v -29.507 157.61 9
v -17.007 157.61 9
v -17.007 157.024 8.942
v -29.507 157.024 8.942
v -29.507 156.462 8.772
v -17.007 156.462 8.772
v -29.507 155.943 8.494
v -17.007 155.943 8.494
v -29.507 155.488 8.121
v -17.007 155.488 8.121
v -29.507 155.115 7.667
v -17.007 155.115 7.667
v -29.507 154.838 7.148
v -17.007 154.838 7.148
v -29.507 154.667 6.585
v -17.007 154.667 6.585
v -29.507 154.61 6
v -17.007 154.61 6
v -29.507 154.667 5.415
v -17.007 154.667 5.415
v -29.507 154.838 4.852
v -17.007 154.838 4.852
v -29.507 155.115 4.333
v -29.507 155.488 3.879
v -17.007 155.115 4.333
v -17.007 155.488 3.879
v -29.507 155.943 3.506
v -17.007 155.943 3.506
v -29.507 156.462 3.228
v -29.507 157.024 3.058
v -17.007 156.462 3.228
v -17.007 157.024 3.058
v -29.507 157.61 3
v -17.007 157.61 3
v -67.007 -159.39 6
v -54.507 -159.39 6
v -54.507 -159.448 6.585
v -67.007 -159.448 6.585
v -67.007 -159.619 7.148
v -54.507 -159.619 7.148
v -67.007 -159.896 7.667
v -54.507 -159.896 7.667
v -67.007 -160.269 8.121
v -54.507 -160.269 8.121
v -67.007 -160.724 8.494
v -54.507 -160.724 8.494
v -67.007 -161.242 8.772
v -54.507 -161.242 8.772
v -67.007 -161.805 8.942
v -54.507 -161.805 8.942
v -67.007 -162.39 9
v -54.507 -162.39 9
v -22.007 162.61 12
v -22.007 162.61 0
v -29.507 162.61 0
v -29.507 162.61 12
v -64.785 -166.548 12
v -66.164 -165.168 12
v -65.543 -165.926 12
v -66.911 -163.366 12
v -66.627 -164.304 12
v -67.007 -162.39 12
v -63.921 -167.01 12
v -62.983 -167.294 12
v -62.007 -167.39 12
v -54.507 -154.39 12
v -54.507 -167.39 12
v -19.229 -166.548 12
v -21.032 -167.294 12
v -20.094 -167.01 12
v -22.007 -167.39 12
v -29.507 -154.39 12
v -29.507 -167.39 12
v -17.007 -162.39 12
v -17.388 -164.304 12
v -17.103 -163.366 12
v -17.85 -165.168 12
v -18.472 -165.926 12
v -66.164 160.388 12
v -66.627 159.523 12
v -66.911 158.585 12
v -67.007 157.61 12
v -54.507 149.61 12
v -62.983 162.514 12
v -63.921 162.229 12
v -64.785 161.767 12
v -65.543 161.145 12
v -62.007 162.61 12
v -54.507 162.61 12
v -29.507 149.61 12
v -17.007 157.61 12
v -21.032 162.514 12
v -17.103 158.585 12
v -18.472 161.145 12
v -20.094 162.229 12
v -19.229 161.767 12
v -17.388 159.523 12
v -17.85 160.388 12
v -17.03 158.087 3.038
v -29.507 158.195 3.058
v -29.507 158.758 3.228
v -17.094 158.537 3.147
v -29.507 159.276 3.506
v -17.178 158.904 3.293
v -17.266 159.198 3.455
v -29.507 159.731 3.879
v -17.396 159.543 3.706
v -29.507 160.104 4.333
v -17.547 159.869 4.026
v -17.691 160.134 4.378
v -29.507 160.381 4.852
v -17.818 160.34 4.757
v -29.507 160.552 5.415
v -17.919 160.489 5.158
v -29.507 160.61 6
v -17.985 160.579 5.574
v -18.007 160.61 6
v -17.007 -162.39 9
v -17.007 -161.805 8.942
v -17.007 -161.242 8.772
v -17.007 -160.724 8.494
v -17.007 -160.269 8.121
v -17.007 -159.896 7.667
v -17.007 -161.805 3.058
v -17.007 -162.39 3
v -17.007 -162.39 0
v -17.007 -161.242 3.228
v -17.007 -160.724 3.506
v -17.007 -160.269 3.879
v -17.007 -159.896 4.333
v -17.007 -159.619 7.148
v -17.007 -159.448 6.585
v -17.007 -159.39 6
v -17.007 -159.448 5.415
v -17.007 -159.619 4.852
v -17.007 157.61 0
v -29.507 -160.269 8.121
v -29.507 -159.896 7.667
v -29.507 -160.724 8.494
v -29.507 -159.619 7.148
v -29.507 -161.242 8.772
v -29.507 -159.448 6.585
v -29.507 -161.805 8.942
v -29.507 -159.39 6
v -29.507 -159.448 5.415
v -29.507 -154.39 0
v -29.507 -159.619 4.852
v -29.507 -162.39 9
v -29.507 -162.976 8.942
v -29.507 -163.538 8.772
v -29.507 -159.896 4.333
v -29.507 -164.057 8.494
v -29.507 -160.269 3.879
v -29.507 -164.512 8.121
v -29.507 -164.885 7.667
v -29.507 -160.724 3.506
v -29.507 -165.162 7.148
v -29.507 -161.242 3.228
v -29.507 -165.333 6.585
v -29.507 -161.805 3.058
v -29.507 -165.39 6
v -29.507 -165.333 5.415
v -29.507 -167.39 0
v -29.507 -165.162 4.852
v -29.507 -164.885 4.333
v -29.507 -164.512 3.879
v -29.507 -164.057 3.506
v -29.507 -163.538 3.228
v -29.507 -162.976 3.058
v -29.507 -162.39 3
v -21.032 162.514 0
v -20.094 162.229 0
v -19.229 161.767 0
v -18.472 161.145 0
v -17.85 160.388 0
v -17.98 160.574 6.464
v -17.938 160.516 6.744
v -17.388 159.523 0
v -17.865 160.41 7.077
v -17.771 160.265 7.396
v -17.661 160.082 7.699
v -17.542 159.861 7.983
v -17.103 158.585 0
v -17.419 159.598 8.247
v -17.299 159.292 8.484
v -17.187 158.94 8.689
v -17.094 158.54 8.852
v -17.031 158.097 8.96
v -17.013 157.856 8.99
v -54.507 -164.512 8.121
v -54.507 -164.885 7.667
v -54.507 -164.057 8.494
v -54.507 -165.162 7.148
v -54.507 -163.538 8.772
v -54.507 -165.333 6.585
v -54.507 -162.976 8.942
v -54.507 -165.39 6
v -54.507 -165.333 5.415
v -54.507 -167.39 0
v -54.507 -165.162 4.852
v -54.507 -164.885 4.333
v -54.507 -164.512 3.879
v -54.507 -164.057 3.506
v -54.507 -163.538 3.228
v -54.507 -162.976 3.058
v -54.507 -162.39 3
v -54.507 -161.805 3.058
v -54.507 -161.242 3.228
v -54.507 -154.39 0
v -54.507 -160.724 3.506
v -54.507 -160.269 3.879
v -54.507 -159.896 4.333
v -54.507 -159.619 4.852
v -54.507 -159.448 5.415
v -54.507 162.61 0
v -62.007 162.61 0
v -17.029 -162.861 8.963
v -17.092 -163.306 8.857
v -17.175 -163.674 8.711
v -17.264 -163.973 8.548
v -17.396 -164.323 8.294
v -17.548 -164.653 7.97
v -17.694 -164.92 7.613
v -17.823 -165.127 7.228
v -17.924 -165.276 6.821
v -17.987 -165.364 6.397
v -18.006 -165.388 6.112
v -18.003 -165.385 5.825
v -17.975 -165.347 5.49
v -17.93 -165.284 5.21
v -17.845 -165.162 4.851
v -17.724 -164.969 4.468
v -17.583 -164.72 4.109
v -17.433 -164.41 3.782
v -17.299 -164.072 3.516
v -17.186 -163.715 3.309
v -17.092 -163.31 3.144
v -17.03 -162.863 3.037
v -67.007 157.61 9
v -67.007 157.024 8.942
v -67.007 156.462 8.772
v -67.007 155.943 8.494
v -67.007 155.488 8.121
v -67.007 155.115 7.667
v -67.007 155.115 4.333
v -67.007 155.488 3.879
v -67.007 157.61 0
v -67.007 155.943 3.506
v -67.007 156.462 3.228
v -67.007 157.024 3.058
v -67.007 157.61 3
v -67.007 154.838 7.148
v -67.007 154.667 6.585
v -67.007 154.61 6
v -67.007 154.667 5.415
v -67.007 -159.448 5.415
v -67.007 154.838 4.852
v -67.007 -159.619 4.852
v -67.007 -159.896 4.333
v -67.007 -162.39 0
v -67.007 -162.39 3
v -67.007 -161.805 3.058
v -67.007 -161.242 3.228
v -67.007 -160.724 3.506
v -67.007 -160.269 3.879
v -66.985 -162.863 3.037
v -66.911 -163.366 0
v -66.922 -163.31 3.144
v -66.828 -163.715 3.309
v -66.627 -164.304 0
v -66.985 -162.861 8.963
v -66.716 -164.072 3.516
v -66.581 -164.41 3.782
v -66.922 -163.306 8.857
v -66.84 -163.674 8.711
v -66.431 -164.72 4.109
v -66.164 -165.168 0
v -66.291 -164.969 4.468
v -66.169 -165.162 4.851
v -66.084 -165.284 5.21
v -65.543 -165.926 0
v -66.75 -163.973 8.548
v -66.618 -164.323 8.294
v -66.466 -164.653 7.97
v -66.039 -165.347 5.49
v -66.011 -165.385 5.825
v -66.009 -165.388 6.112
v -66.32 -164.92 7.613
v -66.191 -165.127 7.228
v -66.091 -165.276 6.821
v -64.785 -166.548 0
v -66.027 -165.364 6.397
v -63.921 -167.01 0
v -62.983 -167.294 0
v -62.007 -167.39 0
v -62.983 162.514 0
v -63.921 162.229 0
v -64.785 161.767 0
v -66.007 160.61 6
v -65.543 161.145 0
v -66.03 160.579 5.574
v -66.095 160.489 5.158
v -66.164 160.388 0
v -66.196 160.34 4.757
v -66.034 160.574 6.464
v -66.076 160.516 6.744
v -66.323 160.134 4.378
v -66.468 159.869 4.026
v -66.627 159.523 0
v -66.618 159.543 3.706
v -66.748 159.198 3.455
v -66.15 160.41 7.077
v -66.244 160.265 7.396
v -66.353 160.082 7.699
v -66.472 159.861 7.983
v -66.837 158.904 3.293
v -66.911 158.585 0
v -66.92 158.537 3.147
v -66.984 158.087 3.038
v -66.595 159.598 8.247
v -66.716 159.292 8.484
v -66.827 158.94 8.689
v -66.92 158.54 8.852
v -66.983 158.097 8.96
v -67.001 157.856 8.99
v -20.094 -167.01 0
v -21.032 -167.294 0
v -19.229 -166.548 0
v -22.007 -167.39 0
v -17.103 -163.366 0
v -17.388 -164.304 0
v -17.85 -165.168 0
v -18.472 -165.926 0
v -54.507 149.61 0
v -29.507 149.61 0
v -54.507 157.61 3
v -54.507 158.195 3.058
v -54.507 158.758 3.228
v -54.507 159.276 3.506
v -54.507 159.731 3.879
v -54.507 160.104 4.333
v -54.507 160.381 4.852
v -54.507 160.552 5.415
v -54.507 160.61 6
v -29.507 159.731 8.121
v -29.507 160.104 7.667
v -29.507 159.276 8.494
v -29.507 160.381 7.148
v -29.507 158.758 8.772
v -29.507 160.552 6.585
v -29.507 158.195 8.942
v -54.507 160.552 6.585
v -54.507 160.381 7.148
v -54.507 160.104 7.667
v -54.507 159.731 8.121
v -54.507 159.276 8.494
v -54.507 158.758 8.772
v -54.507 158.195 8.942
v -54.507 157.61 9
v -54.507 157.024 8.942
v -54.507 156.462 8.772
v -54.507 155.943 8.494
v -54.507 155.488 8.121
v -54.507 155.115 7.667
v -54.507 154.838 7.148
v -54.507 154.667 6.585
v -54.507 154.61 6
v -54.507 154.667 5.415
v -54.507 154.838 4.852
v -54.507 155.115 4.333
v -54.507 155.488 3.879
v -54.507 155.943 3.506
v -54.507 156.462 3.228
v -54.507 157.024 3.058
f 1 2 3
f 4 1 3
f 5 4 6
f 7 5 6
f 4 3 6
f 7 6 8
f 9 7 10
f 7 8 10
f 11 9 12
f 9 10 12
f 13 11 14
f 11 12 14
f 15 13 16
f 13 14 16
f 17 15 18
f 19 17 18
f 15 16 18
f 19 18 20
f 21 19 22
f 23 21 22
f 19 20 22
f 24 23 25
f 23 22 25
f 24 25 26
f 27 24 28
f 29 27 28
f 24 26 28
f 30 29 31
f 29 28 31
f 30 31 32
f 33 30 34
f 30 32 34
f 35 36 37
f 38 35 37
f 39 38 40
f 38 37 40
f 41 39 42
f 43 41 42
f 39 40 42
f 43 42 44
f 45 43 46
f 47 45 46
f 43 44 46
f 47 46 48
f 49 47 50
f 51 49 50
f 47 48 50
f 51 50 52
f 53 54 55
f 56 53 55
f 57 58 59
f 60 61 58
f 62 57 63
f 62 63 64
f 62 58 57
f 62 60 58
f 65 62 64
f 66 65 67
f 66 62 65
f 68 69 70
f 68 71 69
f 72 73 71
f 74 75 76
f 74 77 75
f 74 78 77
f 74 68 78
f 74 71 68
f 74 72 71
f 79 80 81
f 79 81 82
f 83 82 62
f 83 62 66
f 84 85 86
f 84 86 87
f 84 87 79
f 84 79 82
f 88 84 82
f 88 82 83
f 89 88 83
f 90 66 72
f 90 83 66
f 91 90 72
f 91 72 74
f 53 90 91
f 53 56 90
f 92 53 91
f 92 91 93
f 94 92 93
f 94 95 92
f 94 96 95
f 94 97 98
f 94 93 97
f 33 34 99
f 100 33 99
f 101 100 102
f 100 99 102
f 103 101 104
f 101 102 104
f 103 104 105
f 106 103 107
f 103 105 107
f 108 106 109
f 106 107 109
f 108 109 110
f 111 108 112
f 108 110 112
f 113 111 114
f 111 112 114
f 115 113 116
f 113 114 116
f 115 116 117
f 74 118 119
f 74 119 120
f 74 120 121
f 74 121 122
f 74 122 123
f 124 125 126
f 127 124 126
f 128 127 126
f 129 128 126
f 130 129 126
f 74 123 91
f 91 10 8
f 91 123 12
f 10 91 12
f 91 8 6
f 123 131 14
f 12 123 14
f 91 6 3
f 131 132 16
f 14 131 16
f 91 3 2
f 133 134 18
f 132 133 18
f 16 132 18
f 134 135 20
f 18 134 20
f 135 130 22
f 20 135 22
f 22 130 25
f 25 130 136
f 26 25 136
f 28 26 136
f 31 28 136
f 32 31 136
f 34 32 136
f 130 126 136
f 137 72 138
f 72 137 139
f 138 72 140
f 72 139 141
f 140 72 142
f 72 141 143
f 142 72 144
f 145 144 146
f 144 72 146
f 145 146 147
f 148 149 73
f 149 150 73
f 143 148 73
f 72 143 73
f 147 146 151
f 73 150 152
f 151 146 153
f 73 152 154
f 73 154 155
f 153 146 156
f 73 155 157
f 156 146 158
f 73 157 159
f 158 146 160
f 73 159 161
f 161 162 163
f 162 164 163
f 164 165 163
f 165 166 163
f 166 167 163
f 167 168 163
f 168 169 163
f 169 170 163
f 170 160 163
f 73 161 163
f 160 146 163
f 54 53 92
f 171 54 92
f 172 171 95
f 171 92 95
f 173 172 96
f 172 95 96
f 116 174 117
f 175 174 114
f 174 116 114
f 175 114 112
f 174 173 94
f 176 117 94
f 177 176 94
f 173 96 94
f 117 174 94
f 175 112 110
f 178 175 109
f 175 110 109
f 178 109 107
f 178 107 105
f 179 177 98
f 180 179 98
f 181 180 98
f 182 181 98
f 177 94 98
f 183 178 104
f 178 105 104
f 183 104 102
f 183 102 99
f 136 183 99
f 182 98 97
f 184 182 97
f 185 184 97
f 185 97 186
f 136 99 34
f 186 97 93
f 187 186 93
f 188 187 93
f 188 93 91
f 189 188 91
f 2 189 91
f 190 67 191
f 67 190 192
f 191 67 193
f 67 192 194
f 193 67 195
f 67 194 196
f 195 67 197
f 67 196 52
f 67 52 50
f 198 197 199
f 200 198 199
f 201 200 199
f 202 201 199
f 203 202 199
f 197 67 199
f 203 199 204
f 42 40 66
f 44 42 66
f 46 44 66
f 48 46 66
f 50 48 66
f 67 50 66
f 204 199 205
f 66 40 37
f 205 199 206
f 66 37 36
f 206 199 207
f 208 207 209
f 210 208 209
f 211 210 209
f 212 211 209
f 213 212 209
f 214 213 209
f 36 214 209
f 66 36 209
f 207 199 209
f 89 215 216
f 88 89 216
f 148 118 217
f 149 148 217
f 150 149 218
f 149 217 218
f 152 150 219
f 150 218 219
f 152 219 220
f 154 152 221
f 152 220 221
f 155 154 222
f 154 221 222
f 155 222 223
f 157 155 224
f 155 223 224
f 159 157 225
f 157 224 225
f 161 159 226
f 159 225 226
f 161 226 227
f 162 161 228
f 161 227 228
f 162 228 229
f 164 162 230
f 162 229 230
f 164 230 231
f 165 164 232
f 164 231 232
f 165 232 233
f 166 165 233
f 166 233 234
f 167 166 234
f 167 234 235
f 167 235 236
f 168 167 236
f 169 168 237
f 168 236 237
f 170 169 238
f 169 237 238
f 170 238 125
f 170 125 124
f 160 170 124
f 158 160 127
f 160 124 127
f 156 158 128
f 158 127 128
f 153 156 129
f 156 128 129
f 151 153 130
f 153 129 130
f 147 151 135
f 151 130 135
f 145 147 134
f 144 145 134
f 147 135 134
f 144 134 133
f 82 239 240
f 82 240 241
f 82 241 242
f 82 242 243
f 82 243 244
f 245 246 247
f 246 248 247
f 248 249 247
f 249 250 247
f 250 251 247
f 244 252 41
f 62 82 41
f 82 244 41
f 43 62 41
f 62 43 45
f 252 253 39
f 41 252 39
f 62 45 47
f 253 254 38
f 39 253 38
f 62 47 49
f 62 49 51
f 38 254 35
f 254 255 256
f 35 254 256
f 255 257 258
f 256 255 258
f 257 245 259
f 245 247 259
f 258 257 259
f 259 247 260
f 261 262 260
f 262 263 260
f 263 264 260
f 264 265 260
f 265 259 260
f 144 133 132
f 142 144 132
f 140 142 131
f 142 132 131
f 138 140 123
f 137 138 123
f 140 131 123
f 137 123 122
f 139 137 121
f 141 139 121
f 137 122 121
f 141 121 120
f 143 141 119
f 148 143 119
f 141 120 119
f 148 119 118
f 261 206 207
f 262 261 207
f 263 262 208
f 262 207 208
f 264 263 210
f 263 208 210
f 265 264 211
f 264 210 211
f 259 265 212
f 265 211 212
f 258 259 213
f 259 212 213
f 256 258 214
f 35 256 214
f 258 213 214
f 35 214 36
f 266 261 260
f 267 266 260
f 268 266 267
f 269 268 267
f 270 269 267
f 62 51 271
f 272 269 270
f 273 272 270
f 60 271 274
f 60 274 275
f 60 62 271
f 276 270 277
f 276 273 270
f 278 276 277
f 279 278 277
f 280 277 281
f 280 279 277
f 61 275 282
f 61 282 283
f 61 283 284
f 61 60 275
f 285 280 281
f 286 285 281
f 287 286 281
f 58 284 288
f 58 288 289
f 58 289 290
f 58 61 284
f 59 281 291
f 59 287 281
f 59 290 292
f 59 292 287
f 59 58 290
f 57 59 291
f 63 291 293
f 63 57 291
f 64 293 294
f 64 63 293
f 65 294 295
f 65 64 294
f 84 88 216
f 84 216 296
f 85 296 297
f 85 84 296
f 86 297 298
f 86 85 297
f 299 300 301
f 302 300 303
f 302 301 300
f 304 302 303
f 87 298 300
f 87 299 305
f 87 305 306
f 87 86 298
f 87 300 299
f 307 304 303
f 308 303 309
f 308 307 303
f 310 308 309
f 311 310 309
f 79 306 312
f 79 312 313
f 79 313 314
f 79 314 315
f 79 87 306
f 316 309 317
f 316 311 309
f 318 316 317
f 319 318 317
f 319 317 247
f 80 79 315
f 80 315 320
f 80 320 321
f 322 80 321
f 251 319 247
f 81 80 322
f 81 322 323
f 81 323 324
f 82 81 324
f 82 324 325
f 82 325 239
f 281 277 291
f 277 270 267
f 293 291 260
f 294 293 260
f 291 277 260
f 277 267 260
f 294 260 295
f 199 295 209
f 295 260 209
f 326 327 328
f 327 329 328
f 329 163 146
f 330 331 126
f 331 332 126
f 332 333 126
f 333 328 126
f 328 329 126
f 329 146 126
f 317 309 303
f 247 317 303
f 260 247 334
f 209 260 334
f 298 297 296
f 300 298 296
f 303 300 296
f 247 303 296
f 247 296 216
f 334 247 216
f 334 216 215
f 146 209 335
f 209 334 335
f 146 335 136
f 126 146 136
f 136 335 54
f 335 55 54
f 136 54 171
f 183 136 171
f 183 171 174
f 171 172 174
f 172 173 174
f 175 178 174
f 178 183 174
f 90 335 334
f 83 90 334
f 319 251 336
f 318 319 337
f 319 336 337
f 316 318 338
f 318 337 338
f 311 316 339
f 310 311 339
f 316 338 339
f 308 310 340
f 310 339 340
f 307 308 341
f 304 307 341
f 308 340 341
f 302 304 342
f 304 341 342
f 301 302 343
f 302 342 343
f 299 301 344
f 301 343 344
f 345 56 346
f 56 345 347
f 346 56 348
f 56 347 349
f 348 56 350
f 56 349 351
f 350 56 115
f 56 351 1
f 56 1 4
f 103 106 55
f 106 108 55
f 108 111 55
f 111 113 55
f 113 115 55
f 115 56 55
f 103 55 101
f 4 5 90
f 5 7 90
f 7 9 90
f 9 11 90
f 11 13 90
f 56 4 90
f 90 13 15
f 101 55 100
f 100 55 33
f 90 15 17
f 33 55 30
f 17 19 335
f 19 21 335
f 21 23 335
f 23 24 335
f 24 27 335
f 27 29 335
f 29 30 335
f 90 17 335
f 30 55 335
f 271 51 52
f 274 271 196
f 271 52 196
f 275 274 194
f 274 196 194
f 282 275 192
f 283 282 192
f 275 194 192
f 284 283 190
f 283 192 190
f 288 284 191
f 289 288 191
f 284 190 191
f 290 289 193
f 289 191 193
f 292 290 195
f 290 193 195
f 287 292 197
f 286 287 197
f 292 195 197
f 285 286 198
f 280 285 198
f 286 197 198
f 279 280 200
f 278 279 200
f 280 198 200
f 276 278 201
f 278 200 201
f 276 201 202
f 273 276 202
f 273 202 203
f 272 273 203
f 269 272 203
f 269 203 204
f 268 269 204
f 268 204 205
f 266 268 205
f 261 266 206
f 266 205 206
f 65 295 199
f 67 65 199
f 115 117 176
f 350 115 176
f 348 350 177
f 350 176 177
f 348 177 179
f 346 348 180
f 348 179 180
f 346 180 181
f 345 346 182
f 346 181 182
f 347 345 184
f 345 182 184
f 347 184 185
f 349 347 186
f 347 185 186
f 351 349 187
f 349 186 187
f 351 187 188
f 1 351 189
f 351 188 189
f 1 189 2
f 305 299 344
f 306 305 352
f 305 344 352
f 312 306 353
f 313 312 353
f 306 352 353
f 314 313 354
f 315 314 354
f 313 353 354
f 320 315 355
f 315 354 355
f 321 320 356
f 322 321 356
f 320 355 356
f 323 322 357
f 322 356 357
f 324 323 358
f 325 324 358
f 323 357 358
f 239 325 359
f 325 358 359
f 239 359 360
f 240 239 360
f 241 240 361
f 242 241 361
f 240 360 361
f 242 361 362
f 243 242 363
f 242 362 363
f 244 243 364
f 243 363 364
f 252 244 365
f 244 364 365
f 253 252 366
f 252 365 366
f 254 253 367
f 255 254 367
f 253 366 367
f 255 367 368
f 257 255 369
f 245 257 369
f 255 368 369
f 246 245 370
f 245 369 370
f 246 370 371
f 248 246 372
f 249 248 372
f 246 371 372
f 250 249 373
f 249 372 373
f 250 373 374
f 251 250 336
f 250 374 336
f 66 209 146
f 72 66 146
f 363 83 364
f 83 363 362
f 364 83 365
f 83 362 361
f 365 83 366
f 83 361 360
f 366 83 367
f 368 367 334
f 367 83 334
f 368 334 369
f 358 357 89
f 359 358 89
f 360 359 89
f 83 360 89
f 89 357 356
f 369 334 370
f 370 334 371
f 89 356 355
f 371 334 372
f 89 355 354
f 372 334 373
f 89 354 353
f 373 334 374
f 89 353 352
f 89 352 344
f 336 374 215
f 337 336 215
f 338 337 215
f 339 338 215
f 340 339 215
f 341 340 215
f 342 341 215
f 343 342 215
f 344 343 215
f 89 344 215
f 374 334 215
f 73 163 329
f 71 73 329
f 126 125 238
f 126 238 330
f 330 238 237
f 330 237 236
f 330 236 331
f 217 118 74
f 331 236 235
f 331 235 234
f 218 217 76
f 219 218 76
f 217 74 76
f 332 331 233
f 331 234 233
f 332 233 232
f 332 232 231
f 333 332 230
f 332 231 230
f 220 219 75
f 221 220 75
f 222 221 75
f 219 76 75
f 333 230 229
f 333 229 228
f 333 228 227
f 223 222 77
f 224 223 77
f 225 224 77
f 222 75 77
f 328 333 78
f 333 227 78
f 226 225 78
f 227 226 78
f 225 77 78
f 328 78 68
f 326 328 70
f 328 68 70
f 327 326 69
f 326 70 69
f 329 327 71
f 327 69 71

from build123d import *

# Parameters (mm, degrees)
F1_DEPTH = 12
F2_R     = 5
F3_R     = 5
F5_DEPTH = 50.001


with BuildPart() as f1:
    # F0 (on Top) → F1 (new body)
    with BuildSketch(Plane.XY):
        Polygon((-54.5071489434, 162.6097643375), (-67.0071489434, 162.6097643375), (-67.0071489434, -167.3902356625), (-54.5071489434, -167.3902356625), (-54.5071489434, -154.3902356625), (-29.5071489434, -154.3902356625), (-29.5071489434, -167.3902356625), (-17.0071489434, -167.3902356625), (-17.0071489434, 162.6097643375), (-29.5071489434, 162.6097643375), (-29.5071489434, 149.6097643375), (-54.5071489434, 149.6097643375), align=None)
    extrude(amount=F1_DEPTH)

    # F2
    f2_edges = [f1.edges().sort_by_distance(p)[0] for p in [
        (-67.007149, 162.609764, 6),
    ]]
    fillet(f2_edges, radius=F2_R)

    # F3
    f3_edges = [f1.edges().sort_by_distance(p)[0] for p in [
        (-67.007149, -167.390236, 6),
        (-17.007149, -167.390236, 6),
        (-17.007149, 162.609764, 6),
    ]]
    fillet(f3_edges, radius=F3_R)

    # F4 (on face) → F5 (cut, through all)
    with BuildSketch(Plane.YZ.offset(-17.0071489434)):
        with BuildLine():
            Line((157.6097643375, 3), (157.6097643375, 9))
            ThreePointArc((157.6097643375, 9), (154.6097643375, 6), (157.6097643375, 3))
        make_face()
        with BuildLine():
            ThreePointArc((160.6097643375, 6), (159.7310846811, 8.1213203436), (157.6097643375, 9))
            Line((157.6097643375, 9), (157.6097643375, 3))
            ThreePointArc((157.6097643375, 3), (159.7310846811, 3.8786796564), (160.6097643375, 6))
        make_face()
        with BuildLine():
            Line((-162.3902356625, 3), (-162.3902356625, 9))
            ThreePointArc((-162.3902356625, 9), (-165.3902356625, 6), (-162.3902356625, 3))
        make_face()
        with BuildLine():
            ThreePointArc((-162.3902356625, 3), (-160.2689153189, 3.8786796564), (-159.3902356625, 6))
            ThreePointArc((-159.3902356625, 6), (-160.2689153189, 8.1213203436), (-162.3902356625, 9))
            Line((-162.3902356625, 9), (-162.3902356625, 3))
        make_face()
    extrude(amount=-F5_DEPTH, mode=Mode.SUBTRACT)


solid = f1.part
